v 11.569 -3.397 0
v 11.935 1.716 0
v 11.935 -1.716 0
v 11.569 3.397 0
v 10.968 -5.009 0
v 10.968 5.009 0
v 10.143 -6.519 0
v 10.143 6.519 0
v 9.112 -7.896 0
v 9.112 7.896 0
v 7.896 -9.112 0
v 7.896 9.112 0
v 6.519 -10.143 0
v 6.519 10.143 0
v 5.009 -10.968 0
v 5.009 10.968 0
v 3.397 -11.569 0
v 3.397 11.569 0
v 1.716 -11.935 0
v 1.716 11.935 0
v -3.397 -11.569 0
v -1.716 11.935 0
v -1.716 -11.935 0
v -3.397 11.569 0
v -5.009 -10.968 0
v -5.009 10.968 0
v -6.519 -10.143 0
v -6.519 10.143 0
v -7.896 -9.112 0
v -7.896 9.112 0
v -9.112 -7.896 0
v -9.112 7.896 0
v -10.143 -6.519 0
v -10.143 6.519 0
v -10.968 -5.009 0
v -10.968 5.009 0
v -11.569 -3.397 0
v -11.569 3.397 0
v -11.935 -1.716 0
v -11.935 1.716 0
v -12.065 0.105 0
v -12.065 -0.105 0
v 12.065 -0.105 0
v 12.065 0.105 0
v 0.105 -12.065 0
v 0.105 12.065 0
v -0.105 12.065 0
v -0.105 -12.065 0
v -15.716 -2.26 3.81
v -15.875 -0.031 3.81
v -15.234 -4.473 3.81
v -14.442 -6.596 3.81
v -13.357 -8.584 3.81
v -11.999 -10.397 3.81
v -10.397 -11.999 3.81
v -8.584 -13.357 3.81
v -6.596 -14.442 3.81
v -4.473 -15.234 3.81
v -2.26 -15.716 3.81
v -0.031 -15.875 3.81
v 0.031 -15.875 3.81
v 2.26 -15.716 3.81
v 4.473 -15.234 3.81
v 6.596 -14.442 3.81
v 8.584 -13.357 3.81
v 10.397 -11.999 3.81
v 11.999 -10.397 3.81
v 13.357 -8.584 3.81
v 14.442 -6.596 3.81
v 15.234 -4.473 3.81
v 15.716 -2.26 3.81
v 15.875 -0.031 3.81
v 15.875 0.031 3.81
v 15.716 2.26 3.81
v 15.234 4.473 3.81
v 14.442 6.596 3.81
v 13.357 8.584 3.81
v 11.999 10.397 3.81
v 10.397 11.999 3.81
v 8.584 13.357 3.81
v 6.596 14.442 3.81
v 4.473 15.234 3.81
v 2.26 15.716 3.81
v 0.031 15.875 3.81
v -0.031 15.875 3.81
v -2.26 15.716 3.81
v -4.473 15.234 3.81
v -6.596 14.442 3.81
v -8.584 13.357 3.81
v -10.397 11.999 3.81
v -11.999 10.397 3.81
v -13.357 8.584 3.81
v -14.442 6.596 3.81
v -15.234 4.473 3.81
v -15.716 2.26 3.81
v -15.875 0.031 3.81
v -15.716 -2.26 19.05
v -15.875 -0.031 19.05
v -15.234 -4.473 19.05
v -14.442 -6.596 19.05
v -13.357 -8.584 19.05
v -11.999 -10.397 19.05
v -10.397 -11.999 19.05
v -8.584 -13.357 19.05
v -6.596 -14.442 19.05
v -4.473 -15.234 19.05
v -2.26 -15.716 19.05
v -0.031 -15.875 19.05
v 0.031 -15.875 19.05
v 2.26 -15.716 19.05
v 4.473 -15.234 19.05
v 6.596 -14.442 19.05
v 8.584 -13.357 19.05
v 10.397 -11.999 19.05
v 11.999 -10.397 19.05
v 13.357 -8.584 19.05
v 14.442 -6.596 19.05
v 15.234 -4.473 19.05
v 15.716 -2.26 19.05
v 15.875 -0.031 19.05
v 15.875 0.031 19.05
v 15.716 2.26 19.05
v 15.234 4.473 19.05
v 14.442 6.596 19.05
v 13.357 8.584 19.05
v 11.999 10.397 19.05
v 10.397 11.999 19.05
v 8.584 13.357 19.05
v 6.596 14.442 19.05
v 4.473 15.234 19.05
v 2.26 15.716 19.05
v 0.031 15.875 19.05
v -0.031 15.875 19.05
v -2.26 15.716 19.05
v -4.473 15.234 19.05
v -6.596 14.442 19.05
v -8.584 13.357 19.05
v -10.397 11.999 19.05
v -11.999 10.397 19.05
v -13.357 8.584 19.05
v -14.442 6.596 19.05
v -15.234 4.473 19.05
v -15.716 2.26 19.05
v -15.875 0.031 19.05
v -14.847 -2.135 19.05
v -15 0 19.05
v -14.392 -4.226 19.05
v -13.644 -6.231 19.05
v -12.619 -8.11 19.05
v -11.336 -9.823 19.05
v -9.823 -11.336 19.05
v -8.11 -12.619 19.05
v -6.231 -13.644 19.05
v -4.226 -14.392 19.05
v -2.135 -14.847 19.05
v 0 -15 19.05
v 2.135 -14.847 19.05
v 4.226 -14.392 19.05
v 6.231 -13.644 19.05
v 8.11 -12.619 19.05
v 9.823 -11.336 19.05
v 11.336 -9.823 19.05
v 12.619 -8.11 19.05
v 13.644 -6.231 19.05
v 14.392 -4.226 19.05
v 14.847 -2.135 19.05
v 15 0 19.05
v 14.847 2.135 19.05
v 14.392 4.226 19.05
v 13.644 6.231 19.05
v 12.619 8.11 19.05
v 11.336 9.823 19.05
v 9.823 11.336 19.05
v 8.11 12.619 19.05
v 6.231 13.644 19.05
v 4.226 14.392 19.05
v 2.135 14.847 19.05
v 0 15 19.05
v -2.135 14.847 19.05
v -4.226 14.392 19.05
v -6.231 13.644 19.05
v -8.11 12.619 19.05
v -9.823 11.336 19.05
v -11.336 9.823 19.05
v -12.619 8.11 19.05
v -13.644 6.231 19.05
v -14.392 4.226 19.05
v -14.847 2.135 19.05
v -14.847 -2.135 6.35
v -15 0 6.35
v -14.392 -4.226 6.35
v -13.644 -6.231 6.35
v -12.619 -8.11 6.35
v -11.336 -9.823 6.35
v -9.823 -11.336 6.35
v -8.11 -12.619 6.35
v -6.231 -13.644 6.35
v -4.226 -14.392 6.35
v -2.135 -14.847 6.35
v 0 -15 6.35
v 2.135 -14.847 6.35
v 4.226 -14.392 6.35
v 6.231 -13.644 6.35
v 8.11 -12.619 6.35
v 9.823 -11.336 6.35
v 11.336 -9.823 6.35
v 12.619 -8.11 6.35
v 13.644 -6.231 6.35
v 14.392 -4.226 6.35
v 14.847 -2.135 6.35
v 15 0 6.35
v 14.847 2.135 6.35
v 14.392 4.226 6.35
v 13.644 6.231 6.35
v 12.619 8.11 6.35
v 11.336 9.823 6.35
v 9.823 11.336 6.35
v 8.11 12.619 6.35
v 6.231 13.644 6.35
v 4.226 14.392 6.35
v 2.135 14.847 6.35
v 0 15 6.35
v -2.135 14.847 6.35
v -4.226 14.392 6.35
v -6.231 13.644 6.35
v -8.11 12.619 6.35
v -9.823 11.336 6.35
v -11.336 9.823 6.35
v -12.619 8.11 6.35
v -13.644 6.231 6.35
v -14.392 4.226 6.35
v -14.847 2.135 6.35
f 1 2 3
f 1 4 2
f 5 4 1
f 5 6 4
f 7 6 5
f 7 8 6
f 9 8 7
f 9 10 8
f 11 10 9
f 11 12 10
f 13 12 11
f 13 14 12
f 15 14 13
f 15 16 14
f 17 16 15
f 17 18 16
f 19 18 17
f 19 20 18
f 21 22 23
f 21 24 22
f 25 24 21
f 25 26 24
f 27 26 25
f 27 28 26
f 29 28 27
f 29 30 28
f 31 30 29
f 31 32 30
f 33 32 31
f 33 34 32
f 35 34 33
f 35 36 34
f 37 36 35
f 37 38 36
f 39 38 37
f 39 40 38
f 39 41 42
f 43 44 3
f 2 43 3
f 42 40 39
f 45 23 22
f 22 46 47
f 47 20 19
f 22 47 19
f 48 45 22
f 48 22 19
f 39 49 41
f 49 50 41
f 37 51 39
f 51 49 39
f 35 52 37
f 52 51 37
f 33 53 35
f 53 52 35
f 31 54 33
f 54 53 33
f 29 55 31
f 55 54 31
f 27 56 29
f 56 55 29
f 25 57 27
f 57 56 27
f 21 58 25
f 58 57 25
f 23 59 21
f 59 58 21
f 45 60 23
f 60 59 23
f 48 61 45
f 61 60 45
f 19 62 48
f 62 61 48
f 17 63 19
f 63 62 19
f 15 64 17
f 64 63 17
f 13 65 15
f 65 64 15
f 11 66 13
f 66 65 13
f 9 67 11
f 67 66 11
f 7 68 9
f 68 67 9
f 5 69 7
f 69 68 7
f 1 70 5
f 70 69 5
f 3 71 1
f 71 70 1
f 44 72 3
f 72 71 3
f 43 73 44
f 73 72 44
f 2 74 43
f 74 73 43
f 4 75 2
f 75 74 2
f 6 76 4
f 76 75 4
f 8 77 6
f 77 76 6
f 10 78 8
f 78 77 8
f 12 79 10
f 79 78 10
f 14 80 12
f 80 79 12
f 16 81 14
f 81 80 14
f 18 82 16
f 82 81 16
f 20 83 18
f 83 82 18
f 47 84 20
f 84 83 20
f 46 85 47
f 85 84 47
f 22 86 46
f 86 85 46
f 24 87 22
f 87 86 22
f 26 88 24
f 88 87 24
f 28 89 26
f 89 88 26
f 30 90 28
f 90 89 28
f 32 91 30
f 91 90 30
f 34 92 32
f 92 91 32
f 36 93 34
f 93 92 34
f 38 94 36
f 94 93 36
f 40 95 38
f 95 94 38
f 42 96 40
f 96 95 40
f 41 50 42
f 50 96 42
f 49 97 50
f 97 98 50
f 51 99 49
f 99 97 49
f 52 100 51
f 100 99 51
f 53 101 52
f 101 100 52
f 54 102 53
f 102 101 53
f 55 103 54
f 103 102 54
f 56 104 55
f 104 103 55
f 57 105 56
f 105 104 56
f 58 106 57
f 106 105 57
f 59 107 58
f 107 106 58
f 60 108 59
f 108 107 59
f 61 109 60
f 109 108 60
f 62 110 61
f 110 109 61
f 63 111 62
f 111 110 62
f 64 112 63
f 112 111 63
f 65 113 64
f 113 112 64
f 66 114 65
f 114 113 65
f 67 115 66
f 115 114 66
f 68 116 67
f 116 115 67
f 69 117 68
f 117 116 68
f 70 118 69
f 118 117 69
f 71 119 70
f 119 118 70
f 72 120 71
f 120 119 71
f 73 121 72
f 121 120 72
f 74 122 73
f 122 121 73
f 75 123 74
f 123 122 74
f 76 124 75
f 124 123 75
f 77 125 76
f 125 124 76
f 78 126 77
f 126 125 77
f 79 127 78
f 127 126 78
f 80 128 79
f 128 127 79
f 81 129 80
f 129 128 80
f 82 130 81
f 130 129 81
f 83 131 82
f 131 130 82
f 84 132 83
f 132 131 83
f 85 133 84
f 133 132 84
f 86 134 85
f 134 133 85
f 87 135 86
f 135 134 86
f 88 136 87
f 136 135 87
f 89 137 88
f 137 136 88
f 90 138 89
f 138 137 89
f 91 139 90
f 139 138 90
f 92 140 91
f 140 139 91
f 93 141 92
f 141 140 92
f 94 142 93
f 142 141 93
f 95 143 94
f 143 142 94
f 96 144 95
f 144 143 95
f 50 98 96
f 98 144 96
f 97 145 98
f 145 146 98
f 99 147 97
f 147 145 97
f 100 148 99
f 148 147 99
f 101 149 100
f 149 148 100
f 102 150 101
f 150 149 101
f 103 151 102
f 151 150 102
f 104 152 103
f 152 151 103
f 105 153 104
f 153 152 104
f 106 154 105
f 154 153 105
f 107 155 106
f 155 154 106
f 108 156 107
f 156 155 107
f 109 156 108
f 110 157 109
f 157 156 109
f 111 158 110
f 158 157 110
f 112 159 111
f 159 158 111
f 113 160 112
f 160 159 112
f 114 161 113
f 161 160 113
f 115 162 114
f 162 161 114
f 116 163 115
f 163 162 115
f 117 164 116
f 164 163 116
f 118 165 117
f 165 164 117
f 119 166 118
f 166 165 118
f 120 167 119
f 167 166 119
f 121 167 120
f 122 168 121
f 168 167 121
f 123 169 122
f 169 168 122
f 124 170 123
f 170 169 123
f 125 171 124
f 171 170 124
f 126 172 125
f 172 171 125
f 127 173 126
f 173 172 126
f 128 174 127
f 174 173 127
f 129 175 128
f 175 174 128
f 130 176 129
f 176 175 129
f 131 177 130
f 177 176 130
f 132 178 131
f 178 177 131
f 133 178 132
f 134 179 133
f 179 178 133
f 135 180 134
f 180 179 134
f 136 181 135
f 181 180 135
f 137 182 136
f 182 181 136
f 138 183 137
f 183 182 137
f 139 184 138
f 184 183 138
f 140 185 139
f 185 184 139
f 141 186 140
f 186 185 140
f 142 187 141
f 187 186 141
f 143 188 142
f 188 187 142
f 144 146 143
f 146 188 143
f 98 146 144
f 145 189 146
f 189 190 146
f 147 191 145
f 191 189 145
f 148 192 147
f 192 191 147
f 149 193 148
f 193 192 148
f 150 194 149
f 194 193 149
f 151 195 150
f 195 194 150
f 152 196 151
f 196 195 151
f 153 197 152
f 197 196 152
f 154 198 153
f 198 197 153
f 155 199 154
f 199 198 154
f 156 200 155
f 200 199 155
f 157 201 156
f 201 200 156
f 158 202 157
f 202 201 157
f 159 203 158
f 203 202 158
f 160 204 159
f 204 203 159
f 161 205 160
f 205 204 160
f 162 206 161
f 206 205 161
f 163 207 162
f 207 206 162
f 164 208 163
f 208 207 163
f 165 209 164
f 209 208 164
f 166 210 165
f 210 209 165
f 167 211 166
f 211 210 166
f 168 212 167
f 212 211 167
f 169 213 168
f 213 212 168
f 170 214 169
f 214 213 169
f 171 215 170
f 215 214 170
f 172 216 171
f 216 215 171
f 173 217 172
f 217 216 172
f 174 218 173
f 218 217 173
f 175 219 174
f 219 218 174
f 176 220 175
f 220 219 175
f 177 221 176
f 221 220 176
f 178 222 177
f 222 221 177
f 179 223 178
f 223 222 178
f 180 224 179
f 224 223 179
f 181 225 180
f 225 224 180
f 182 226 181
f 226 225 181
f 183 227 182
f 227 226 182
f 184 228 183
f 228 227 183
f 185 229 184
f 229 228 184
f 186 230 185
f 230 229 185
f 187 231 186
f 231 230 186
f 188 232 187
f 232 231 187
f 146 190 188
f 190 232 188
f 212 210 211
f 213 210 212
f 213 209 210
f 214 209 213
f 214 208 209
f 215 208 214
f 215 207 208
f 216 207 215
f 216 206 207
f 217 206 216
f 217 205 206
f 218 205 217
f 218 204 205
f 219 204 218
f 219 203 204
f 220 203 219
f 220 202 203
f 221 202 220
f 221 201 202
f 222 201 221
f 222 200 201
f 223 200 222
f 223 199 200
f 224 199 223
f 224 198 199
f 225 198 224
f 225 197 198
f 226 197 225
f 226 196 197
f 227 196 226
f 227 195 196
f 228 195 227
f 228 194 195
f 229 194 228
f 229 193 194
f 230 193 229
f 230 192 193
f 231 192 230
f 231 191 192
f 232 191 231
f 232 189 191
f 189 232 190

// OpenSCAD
// file: ../lib/TOGMod1Constructors.scad
// TOGMod1Constructors-v1.11
// 
// Functions to construct objects understood by TOGMod1
// 
// v1.1:
// - Add togmod1_make_rounded_rect
// v1.2:
// - togmod1_make_rounded_rect can make ovals
// v1.3:
// - togmod1_circle_points, to just get the points of a circle
// - if pos parameter to circle function has a third element,
//   returned vertexes will include it as the z component;
// v1.3.1
// - Some assertions
// v1.4:
// - Refactor togmod1_rounded_rect_points and togmod1_circle_points
//   to use togmod1__make_nd_vector_adder for adapting to whatever
//   `pos` parameter is.
// v1.5:
// - togmod_rounded_rect_points will not simplify completely rounded sides
//   (where length of side is exactly twice the rounding radius)
//   unless simplify_rounded_sides=true
//   - This makes it more useful for polyhedron generation,
//     where radius varies, but number of points must remain constant.
// v1.6:
// - togmod1_make_rect makes a simple rectangle
// - togmod1_make_rounded_rect will defer to togmod1_make_rect when r=0
// v1.7:
// - togmod1_make_circle will return empty shape (["union"]) when d=0
// v1.8:
// - Add togmod1_text
// v1.9:
// - togmod1_circle_points uses 3 as minimum circle point count instead of 6
// v1.10:
// - Fix togmod1_linear_extrude_y so that range corresponds to Y start/end and
//   polygon X,Y correspond to X,Z.  Previously it was rotated wrongly,
//   which would have gone unnoticed for symmetrical shapes centered at 0,0.
// v1.11:
// - Remove an 'echo'

use <./TOGArrayLib1.scad>

function togmod1__make_nd_vector_adder(origin=[0,0]) =
	let(origin_is_zero = tal1_reduce(true, origin, function(prev,item) prev && item == 0))
	origin_is_zero ? (function(vec) len(vec) >= len(origin) ? vec : tal1_replace_at(origin, 0, vec)) :
	function(vec) [
		for(i=[0:1:max(len(origin),len(vec))-1]) (len(vec) > i ? vec[i] : 0) + (len(origin) > i ? origin[i] : 0),
	];

assert([1,2,3] == togmod1__make_nd_vector_adder()([1,2,3]));
assert([1,2,3] == togmod1__make_nd_vector_adder([0,0,3])([1,2]));


function togmod1_make_cuboid(size) =
	assert(is_list(size))
	assert(len(size) >= 3)
	assert(is_num(size[0]))
	assert(is_num(size[1]))
	assert(is_num(size[2]))
	["polyhedron-vf", [
		[-size[0]/2, -size[1]/2, -size[2]/2],
		[+size[0]/2, -size[1]/2, -size[2]/2],
		[-size[0]/2, +size[1]/2, -size[2]/2],
		[+size[0]/2, +size[1]/2, -size[2]/2],
		[-size[0]/2, -size[1]/2, +size[2]/2],
		[+size[0]/2, -size[1]/2, +size[2]/2],
		[-size[0]/2, +size[1]/2, +size[2]/2],
		[+size[0]/2, +size[1]/2, +size[2]/2]
	], [
		[0,1,3,2],[0,4,5,1],[4,6,7,5],[3,7,6,2],[1,5,7,3],[6,4,0,2]
	]];

function togmod1_make_polygon(verts) =
	["polygon-vp", verts, [[for( i=[0:1:len(verts)-1] ) i%len(verts)]]];

function togmod1_rounded_rect_points(size, r, pos=[0,0], simplify_rounded_sides=false) =
	assert(is_list(size))
	assert(len(size) >= 2)
	let(radii = is_list(r) ? r : is_num(r) ? [r,r] : assert(false, "rounded_rect r(adius) should be list<num> or num"))
	let(rx = radii[0])
	let(ry = radii[1])
	assert(is_num(rx))
	assert(is_num(ry))
	assert(size[0] >= 2*rx, str("size[0] must be >= 2*r[0]; size[0] = ",size[0],", 2*r[0] = ",2*rx))
	assert(size[1] >= 2*ry, str("size[1] must be >= 2*r[1]; size[1] = ",size[1],", 2*r[1] = ",2*ry))
	let(quarterfn=max($fn/4, 1))
	let(qfnx = simplify_rounded_sides && size[0] == 2*rx ? quarterfn-1 : quarterfn)
	let(qfny = simplify_rounded_sides && size[1] == 2*ry ? quarterfn-1 : quarterfn)
	let(finalizepos = togmod1__make_nd_vector_adder(pos))
[
	for(a=[0 : 1 : qfnx]) let(ang=      a*90/quarterfn) finalizepos([ size[0]/2-rx + rx*cos(ang),  size[1]/2-ry + ry*sin(ang)]),
	for(a=[0 : 1 : qfny]) let(ang= 90 + a*90/quarterfn) finalizepos([-size[0]/2+rx + rx*cos(ang),  size[1]/2-ry + ry*sin(ang)]),
	for(a=[0 : 1 : qfnx]) let(ang=180 + a*90/quarterfn) finalizepos([-size[0]/2+rx + rx*cos(ang), -size[1]/2+ry + ry*sin(ang)]),
	for(a=[0 : 1 : qfny]) let(ang=270 + a*90/quarterfn) finalizepos([ size[0]/2-rx + rx*cos(ang), -size[1]/2+ry + ry*sin(ang)]),
];

function togmod1_make_rect(size) =
	togmod1_make_polygon([
		[-size[0]/2, -size[1]/2],
		[+size[0]/2, -size[1]/2],
		[+size[0]/2, +size[1]/2],
		[-size[0]/2, +size[1]/2],
	]);

function togmod1_make_rounded_rect(size, r) =
	r == 0 ? togmod1_make_rect(size) :
	togmod1_make_polygon(togmod1_rounded_rect_points(size,r,simplify_rounded_sides=true));

/**
 * Returns points for an approximation of a circle where points are at distance r from pos.
 * Can be used to make other regular polygons, but the faces will be less than that
 * distance from pos (do some trig if you want face distance, e.g. for a hex nut).
 */
function togmod1_circle_points(r, pos=[0,0], d=undef) =
	assert( !is_undef(r) || !is_undef(d) )
	assert(!is_undef(pos[0]))
	assert(!is_undef(pos[1]))
	let(finalizepos = togmod1__make_nd_vector_adder(pos))
	let(r_ = !is_undef(r) ? r : d/2)
	let(fn = max($fn, 3))
	[for(i=[0 : 1 : fn-1]) finalizepos([r_*cos(i*360/fn), r_*sin(i*360/fn)])];

function togmod1_make_circle(r, pos=[0,0], d=undef) =
	r == 0 || d == 0 ? ["union"] :
	togmod1_make_polygon(togmod1_circle_points(r=r, pos=pos, d=d));

function togmod1_make_cylinder(d, zrange=[0,1], r=undef, pos=[0,0]) =
	assert( !is_undef(r) || !is_undef(d) )
	let( r_ = !is_undef(r) ? r : d/2 )
	// TODO: Make polyhedron directly
	["linear-extrude-zs", zrange, togmod1_make_circle(r=r_, pos=pos)];

function togmod1__is_range1d(range) = is_list(range) && len(range) == 2 && is_num(range[0]) && is_num(range[1]);

function togmod1_linear_extrude_z(range, shape) =
	assert(togmod1__is_range1d(range))
	["linear-extrude-zs", range, shape];
function togmod1_linear_extrude_x(range, shape) =
	assert(togmod1__is_range1d(range))
	["rotate", [90, 0, 90], togmod1_linear_extrude_z(range, shape)];
function togmod1_linear_extrude_y(range, shape) =
	assert(togmod1__is_range1d(range))
	["rotate", [90, 0,  0], togmod1_linear_extrude_z([-range[1], -range[0]], shape)];

function togmod1_text(text, size, font, halign, valign, spacing, direction, language, script) =
	["text-tsfhvsdls", text, size, font, halign, valign, spacing, direction, language, script];
// file: ../lib/TOGArrayLib1.scad
// TOGArrayLib1.5
// 
// Functions for working with arrays.
// 
// v1.1:
// - tal1_reduce assert(is_list(items)) to prevent infinite recursion
//   when given undefined or other non-list values
// v1.1.1:
// - Fix tal1_uniq_remap_v2 to return "list-remap-result" as the
//   first element of the returned list
// v1.2:
// - Add tal1_replace_at function
// v1.3:
// - tal1_is_vec_of, tal1_is_vec_of_num
// v1.4:
// - tal1_assert_for_each, for when you want to assert something
//   about each of a list of items and get nice failure messages
// v1.5:
// - Add tal1_duplicate_reversed function, which may be
//   handy when generating symmetrical polygons and stuff.

/**
 * Make a list with the contents of list `a`,
 * but starting at offset `off`, replaced by the contents of list `b`.
 * len(result) = max(len(a), off+len(b))
 */
function tal1_replace_at(a, off, b, default_value=undef, default_value_function=undef) =
	assert(is_list(a))
	assert(is_list(b))
	let( _dvf = !is_undef(default_value_function) ? default_value_function : function(i) default_value )
[
	for( i=[0:1:min(off,len(a))-1] ) a[i],
	for( i=[len(a):1:off-1] ) _dvf(i),
	for( i=[off:1:off+len(b)-1] ) b[i-off],
	for( i=[off+len(b):1:len(a)-1] ) a[i],
];

// Simplest case
assert([] == tal1_replace_at([], 0, []));
// Second simplest cases
assert(["foo"] == tal1_replace_at(["foo"], 0, []));
assert(["foo"] == tal1_replace_at([], 0, ["foo"]));
// Replace one item
assert(["foo","quux","baz"] == tal1_replace_at(["foo","bar","baz"], 1, ["quux"]));
// Replace and extend
assert(["foo","quux","tuna","tina"] == tal1_replace_at(["foo","bar","baz"], 1, ["quux", "tuna", "tina"]));
// Add beyond end of `a`
assert(["foo","zzz","quux"] == tal1_replace_at(["foo"], 2, ["quux"], default_value="zzz"));
// Adding 'nothing' should still fill to that point with defaults
assert(["foo","zzz","zzz"] == tal1_replace_at(["foo"], 3, [], default_value="zzz"));


function tal1_reduce(start, items, func, offset=0) =
	assert(is_list(items))
	len(items) == offset ? start :
	tal1_reduce(func(start, items[offset]), items, func, offset+1);

function tal1_consecutive_duplicate_count(items) = tal1_reduce(
	[0, undef],
	items,
	function(z,item) [z[0] + (item == z[1] ? 1 : 0), item]
)[0];

assert(0 == tal1_consecutive_duplicate_count([]));
assert(0 == tal1_consecutive_duplicate_count([50]));
assert(1 == tal1_consecutive_duplicate_count([50,50]));
assert(0 == tal1_consecutive_duplicate_count([50,51,52,53]));
assert(1 == tal1_consecutive_duplicate_count([50,51,52,52]));
assert(3 == tal1_consecutive_duplicate_count([50,50,50,50]));

// Set test_size to arbirarily large values
// to ensure that OpenSCAD can handle heavy recursion
let(test_size=1000) assert(test_size/2 == tal1_consecutive_duplicate_count([for(i=[0:1:test_size-1]) floor(i/2)]));



function tal1_uniq_(items, off0, off1) =
	let(chunklen = off1-off0)
	chunklen == 0 ? [] :
	chunklen == 1 ? [items[off0]] :
	let(half=floor(chunklen/2))
	let(left  = tal1_uniq_(items, off0     , off0+half))
	let(right = tal1_uniq_(items, off0+half, off1     ))
	assert(len(left) > 0)
	assert(len(right) > 0)
	left[len(left)-1] == right[0] ? [each left, for(i=[1:1:len(right)-1]) right[i]] :
	[each left, each right];

/** Given a list of items, returns a new list with identical consecutive items merged */
function tal1_uniq(items) = tal1_uniq_(items, 0, len(items));

assert([] == tal1_uniq([]));
assert([123] == tal1_uniq([123]));
assert([55,0,1,2,3] == tal1_uniq([55,0,1,2,3]));
assert([55,0,1,2] == tal1_uniq([55,0,1,1,2]));
assert([55,0,1] == tal1_uniq([55,55,0,0,0,0,0,0,1,1,1,1]));
assert([55,0] == tal1_uniq([55,0,0,0,0,0,0,0]));



/**
 * Returns [new items, old index -> new index mapping].
 * No-op version.
 */
function tal1_uniq_remap_v1(items) =
	["list-remap-result", items, [for (vi=[0:1:len(items)-1]) vi]];

// [a, a, b, b, c, c]
//
// [a,    ...], []  -> [a],[0]
// [a, a, ...], [0] -> [a],[0,0]

assert([1,2,3] == [1,2,3]);

/**
 * Recursive version that will combine adjacent identical vertexes,
 * but will use the original items.
 */
function tal1_uniq_remap_v2(items, map=[]) =
	let(index = len(map))
	len(items) == index ? ["list-remap-result", items, map] :
	index == 0 ? tal1_uniq_remap_v2(items, [0]) :
	items[index] == items[map[index-1]] ? tal1_uniq_remap_v2(items, [for(vi=map) vi, map[index-1]]) :
	tal1_uniq_remap_v2(items, [for(vi=map) vi, index]);

assert(tal1_uniq_remap_v2([1,1,2,2,3,4]) == ["list-remap-result", [1,1,2,2,3,4], [0,0,2,2,4,5]]);


/**
 * Returns true if `vec` is a list of at least min_len items
 * and component_check(each item, even those beyond min_len) is true.
 */
function tal1_is_vec_of(vec, min_len=0, component_check=function(x) true) =
	assert(is_num(min_len) && min_len >= 0)
	assert(is_function(component_check))
	is_list(vec) && len(vec) >= min_len &&
	tal1_reduce(true, vec, function(prev,item) prev && component_check(item));

function tal1_is_vec_of_num(vec, min_len=0) = tal1_is_vec_of(vec, min_len, function(i) is_num(i));

assert( true == tal1_is_vec_of_num([1,2,3]));
assert( true == tal1_is_vec_of_num([]));
assert( true == tal1_is_vec_of_num([1,2,3], 3));
assert(false == tal1_is_vec_of_num([1,2], 3));
assert(false == tal1_is_vec_of_num([1,2,"spoon"], 3));
// Requirements are ambiguous when
// first min_len items are numbers, but there are non-numeric items afterwards,
// so let's error on the side of saying 'no, it's not a list of numbers';
// i.e. the item check and the min_len are independent.
assert(false == tal1_is_vec_of_num([1,2,3,"artichoke"], 3));


/**
 * Asserts that item_checker(each item in list, index of item)[0] is true.
 * Second element of item_checker return value is assertion message.
 * Returns the original list, in case that's useful to you.
 */
function tal1_assert_for_each(list, item_checker) =
	let( _ignored = [ for(i=[0:1:len(list)-1])
		let(q=item_checker(list[i],i))
		let(passed=is_bool(q) ? q : is_list(q) ? q[0] : assert(false, str(
			"tal1_assert_for_each: item_checker should return Bool|[Bool,String], but returned ",
			q, " for item at index ", i)))
		let(message=is_list(q) ? q[1] : undef)
		assert(passed, message)
		q
	])
	list;

// Callback can return a boolean...
assert([1,2,3] == tal1_assert_for_each([1,2,3], function(v,i) is_num(v)));
// ...or a [boolean, string]
assert([1,2,3] == tal1_assert_for_each([1,2,3], function(v,i) [is_num(v), "element be a num"]));

// [a, b, c] -> [a, b, c, rxf(c), rxf(b), rxf(a)]
function tal1_duplicate_reversed(list, rxf=function(item) item) =
	[
		each list,
		for( i=[len(list)-1 : -1 : 0] ) rxf(list[i]),
	];
// file: ../lib/TOGComplexLib1.scad
function tcplx1_multiply(a, b) =
	[a[0]*b[0] - a[1]*b[1], a[0]*b[1] + a[1]*b[0]];
function tcplx1_divide(a, b) =
	let(bot = (b[0]*b[0] + b[1]*b[1]))
	[
		(a[0]*b[0] + a[1]*b[1])/bot,
		(a[1]*b[0] - a[0]*b[1])/bot
	];

assert([-11,23] == tcplx1_multiply([3,2], [1,7]));

assert([-1,3] == tcplx1_multiply([3,1], [0,1]));
assert([-1,3] == tcplx1_multiply([0,1], [3,1]));

echo(tcplx1_divide([-1,3], [3,1]));
assert([0,1] == tcplx1_divide([-1,3], [3,1]));

function tcplx1_normalize(vec) =
	let(veclen = sqrt(vec[0]*vec[0]+vec[1]*vec[1]))
	[vec[0] / veclen, vec[1] / veclen];

function tcplx1_relative_turnvec_vv(v0, v1) =
	tcplx1_divide(tcplx1_normalize(v1), tcplx1_normalize(v0));

function tcplx1_relative_turnvec_abc(p0, p1, p2) = tcplx1_relative_turnvec_vv(p1-p0, p2-p1);

// A 90-degree turn
assert([0,1] == tcplx1_relative_turnvec_abc([0,0], [1,0], [1,1]));
assert([0,1] == tcplx1_relative_turnvec_abc([0,0], [0,1], [-1,1]));

// A 45-degree turn
assert(tcplx1_normalize([1,1]) == tcplx1_relative_turnvec_abc([0,0], [1,0], [ 2,1]));
assert(tcplx1_normalize([1,1]) == tcplx1_relative_turnvec_abc([0,0], [0,1], [-1,2]));


function tcplx1_relative_angle_abc(p0, p1, p2) =
	let(turnvec = tcplx1_relative_turnvec_abc(p0, p1, p2))
	atan2(turnvec[1], turnvec[0]);

assert(-135 == tcplx1_relative_angle_abc([0,0], [1,0], [0,-1]));
assert( -90 == tcplx1_relative_angle_abc([0,0], [1,0], [1,-1]));
assert(   0 == tcplx1_relative_angle_abc([0,0], [1,0], [2, 0]));
assert(  90 == tcplx1_relative_angle_abc([0,0], [1,0], [1, 1]));
assert( 135 == tcplx1_relative_angle_abc([0,0], [1,0], [0, 1]));

assert(  90 == tcplx1_relative_angle_abc([1,1], [3,3], [1, 5]));
// file: ../lib/TOGVecLib0.scad
// Note: TOGMod1Constructors's togmod1__make_nd_vector_adder is used for similar purpose.

function togvec0_extend(vec, length, filler=0) = [
	for( i=[0 : 1 : length-1] ) len(vec) <= i ? filler : vec[i]
];

function togvec0_add_vec(a, b) =
	let( newlen = max(len(a), len(b)) )
	togvec0_extend(a, newlen) + togvec0_extend(b, newlen);

function togvec0_offset_points(points, offset, numtovec=function(n) [0,0,n] ) =
	let( offset_vec =
		is_list(offset) ? offset :
		is_num(offset) ? numtovec(offset) :
		assert(false, str("togvec0_offset_points: `offset` must be a List<Number> or Number; got: ", offset)) )
	[for(p=points) togvec0_add_vec(p, offset_vec)];
// file: ../lib/SimpleCap0.scad
// SimpleCap0.4
// 
// Library for making very simple caps for things
// whose outline can be described by a rath.
// 
// Versions:
// v0.2:
// - Bevel the bottom somewhat
// v0.3:
// - Allow bevel_size to be overridden.
//   Useful in cases where the default makes an invalid shape.
// v0.4
// - Support floor_thickness=0 meaning 'hollow tube'

use <../lib/TOGPath1.scad>
use <../lib/TOGPolyhedronLib1.scad>
use <../lib/TOGVecLib0.scad>

function simplecap0_decode_rath(shape) =
	assert(is_list(shape) && len(shape) >= 1, str("Shape must be a list of length at least 1, got: ", shape))
	shape[0] == "togpath1-rath" ? shape :
	shape[0] == "circle-d" ? togpath1_make_circle_rath(r=shape[1]/2) :
	shape[0] == "circle-r" ? togpath1_make_circle_rath(r=shape[1]) :
	shape[0] == "oval-wh" ? let(size=shape[1]) togpath1_make_rectangle_rath([size[0],size[1]], [["round", min(size[0],size[1])/2]]) :
	assert(false, str("Unrecognized shape description: ", shape));

function simplecap0_make_cap(inner_shape, total_height=19.05, floor_thickness=3.175, wall_thickness=1.6, bevel_size=undef) =
	let( rath = simplecap0_decode_rath(inner_shape) )
	let( eff_bevel_size = !is_undef(bevel_size) ? bevel_size :
		// Could be clever here based on wall_thickness and the rath.
		// For now, default to effectively floor_thicknesS*0.6, since that matches existing behavior.
		max(0.1, floor_thickness*0.6)
	)
	let( t0 = 0, t1 = wall_thickness )
	let( y0 = 0, yt = total_height, yf = floor_thickness )
	let( bb = eff_bevel_size )
	let( closed = yf > 0 )
	tphl1_make_polyhedron_from_layer_function([
		[y0   , t1-bb],
		[y0+abs(bb), t1   ],
		[yt   , t1   ],
		[yt   , t0   ],
		[yf   , t0   ],
		if( !closed ) [yf, t1-bb],
	], function(zo) let(z = zo[0], wall_offset=zo[1])
	   togpath1_rath_to_polypoints(togpath1_offset_rath(rath, wall_offset)),
		layer_points_transform = "key0-to-z",
		cap_top    = closed,
		cap_bottom = closed
	);
// file: ../lib/TOGMod1.scad
// TOGMod1.9
// OpenSCAD library for representing shapes
// 
// See also: Functional OpenSCAD (https://github.com/thehans/FunctionalOpenSCAD)
// 
// v1.8:
// - Add `text-tsfhvsdls`
// v1.9
// - Add `offset-ds` (offset with _d_elta a _s_hape)

module togmod1_domodule(mod) {
	assert(is_list(mod));
	assert(len(mod) > 0);
	if( mod[0] == "polygon-vp" ) {
		// ["polygon-vp", vertexes, paths]
		polygon(points=mod[1], paths=mod[2]);
	} else if( mod[0] == "polyhedron-vf" ) {
		polyhedron(mod[1], faces=mod[2]);
	} else if( mod[0] == "scale" ) {
		assert(len(mod) == 3);
		scale(mod[1]) togmod1_domodule(mod[2]);
	} else if( mod[0] == "translate" ) {
		assert(len(mod) == 3);
		assert(is_list(mod[1]));
		for(c=mod[1]) assert(is_num(c), "translate component should be numeric");
		translate(mod[1]) togmod1_domodule(mod[2]);
	} else if( mod[0] == "rotate" ) {
		assert(len(mod) == 3);
		rotate(mod[1]) togmod1_domodule(mod[2]);
	} else if( mod[0] == "intersection" ) {
		intersection_for( i=[1:1:len(mod)-1] ) togmod1_domodule(mod[i]);
	} else if( mod[0] == "difference" ) {
		difference() {
			togmod1_domodule(mod[1]);
			for( i=[2:1:len(mod)-1] ) togmod1_domodule(mod[i]);
		}
	} else if( mod[0] == "union" ) {
		for( i=[1:1:len(mod)-1] ) togmod1_domodule(mod[i]);
	} else if( mod[0] == "hull" ) {
		hull() for( i=[1:1:len(mod)-1] ) togmod1_domodule(mod[i]);
	} else if( mod[0] == "offset-rs" ) {
		assert(len(mod) == 3);
		assert(is_num(mod[1]));
		assert(is_list(mod[2]));
		offset(mod[1]) togmod1_domodule(mod[2]);
	} else if( mod[0] == "linear-extrude-zs" ) {
		// ["linear-extrude-zs", [z0,z1], 2d_shape] // centered
		// ["linear-extrude-zs", height, 2d_shape]
		let( zrange = is_list(mod[1]) ? mod[1] : [-mod[1]/2, mod[1]/2] ) {
			translate([0,0,zrange[0]]) linear_extrude(zrange[1]-zrange[0]) togmod1_domodule(mod[2]);
		}
	} else if( mod[0] == "render" ) {
		render() togmod1_domodule(mod[1]);
	} else if( mod[0] == "minkowski" ) {
		minkowski() {
			togmod1_domodule(mod[1]);
			togmod1_domodule(mod[2]);
		}
	} else if( mod[0] == "x-debug" ) {
		# togmod1_domodule(mod[1]);
	} else if( mod[0] == "x-color" ) {
		color(mod[1]) togmod1_domodule(mod[2]);
	} else if( mod[0] == "text-tsfhvsdls" ) {
		text(text=mod[1], size=mod[2], font=mod[3], halign=mod[4], valign=mod[5], spacing=mod[6], direction=mod[7], language=mod[7], script=mod[8]);
	} else if( mod[0] == "offset-ds" ) {
		assert(is_num(mod[1]));
		assert(is_list(mod[2]));
		offset(delta=mod[1]) togmod1_domodule(mod[2]);
	} else {
		assert(false, str("Unrecognized shape: ", mod[0]));
	}
}
// main file
// BarCap0.1
// 
// Generic cap for round bars.
// 
// Presets are for some almost-30mm galvanized stell conduit
// that Renee wants to use as a pullup bar.  These will cap
// those so that they fit snugly into 1+1/4" slots.

inner_diameter = 30;
outer_diameter = 31.75;
floor_thickness = 6.35;
total_height = 19.05;
$fn = 48;

module __barcap0__end_params() { }

use <../lib/TOGMod1.scad>
use <../lib/SimpleCap0.scad>

togmod1_domodule(simplecap0_make_cap(["circle-d", inner_diameter], total_height, floor_thickness, (outer_diameter-inner_diameter)/2));
